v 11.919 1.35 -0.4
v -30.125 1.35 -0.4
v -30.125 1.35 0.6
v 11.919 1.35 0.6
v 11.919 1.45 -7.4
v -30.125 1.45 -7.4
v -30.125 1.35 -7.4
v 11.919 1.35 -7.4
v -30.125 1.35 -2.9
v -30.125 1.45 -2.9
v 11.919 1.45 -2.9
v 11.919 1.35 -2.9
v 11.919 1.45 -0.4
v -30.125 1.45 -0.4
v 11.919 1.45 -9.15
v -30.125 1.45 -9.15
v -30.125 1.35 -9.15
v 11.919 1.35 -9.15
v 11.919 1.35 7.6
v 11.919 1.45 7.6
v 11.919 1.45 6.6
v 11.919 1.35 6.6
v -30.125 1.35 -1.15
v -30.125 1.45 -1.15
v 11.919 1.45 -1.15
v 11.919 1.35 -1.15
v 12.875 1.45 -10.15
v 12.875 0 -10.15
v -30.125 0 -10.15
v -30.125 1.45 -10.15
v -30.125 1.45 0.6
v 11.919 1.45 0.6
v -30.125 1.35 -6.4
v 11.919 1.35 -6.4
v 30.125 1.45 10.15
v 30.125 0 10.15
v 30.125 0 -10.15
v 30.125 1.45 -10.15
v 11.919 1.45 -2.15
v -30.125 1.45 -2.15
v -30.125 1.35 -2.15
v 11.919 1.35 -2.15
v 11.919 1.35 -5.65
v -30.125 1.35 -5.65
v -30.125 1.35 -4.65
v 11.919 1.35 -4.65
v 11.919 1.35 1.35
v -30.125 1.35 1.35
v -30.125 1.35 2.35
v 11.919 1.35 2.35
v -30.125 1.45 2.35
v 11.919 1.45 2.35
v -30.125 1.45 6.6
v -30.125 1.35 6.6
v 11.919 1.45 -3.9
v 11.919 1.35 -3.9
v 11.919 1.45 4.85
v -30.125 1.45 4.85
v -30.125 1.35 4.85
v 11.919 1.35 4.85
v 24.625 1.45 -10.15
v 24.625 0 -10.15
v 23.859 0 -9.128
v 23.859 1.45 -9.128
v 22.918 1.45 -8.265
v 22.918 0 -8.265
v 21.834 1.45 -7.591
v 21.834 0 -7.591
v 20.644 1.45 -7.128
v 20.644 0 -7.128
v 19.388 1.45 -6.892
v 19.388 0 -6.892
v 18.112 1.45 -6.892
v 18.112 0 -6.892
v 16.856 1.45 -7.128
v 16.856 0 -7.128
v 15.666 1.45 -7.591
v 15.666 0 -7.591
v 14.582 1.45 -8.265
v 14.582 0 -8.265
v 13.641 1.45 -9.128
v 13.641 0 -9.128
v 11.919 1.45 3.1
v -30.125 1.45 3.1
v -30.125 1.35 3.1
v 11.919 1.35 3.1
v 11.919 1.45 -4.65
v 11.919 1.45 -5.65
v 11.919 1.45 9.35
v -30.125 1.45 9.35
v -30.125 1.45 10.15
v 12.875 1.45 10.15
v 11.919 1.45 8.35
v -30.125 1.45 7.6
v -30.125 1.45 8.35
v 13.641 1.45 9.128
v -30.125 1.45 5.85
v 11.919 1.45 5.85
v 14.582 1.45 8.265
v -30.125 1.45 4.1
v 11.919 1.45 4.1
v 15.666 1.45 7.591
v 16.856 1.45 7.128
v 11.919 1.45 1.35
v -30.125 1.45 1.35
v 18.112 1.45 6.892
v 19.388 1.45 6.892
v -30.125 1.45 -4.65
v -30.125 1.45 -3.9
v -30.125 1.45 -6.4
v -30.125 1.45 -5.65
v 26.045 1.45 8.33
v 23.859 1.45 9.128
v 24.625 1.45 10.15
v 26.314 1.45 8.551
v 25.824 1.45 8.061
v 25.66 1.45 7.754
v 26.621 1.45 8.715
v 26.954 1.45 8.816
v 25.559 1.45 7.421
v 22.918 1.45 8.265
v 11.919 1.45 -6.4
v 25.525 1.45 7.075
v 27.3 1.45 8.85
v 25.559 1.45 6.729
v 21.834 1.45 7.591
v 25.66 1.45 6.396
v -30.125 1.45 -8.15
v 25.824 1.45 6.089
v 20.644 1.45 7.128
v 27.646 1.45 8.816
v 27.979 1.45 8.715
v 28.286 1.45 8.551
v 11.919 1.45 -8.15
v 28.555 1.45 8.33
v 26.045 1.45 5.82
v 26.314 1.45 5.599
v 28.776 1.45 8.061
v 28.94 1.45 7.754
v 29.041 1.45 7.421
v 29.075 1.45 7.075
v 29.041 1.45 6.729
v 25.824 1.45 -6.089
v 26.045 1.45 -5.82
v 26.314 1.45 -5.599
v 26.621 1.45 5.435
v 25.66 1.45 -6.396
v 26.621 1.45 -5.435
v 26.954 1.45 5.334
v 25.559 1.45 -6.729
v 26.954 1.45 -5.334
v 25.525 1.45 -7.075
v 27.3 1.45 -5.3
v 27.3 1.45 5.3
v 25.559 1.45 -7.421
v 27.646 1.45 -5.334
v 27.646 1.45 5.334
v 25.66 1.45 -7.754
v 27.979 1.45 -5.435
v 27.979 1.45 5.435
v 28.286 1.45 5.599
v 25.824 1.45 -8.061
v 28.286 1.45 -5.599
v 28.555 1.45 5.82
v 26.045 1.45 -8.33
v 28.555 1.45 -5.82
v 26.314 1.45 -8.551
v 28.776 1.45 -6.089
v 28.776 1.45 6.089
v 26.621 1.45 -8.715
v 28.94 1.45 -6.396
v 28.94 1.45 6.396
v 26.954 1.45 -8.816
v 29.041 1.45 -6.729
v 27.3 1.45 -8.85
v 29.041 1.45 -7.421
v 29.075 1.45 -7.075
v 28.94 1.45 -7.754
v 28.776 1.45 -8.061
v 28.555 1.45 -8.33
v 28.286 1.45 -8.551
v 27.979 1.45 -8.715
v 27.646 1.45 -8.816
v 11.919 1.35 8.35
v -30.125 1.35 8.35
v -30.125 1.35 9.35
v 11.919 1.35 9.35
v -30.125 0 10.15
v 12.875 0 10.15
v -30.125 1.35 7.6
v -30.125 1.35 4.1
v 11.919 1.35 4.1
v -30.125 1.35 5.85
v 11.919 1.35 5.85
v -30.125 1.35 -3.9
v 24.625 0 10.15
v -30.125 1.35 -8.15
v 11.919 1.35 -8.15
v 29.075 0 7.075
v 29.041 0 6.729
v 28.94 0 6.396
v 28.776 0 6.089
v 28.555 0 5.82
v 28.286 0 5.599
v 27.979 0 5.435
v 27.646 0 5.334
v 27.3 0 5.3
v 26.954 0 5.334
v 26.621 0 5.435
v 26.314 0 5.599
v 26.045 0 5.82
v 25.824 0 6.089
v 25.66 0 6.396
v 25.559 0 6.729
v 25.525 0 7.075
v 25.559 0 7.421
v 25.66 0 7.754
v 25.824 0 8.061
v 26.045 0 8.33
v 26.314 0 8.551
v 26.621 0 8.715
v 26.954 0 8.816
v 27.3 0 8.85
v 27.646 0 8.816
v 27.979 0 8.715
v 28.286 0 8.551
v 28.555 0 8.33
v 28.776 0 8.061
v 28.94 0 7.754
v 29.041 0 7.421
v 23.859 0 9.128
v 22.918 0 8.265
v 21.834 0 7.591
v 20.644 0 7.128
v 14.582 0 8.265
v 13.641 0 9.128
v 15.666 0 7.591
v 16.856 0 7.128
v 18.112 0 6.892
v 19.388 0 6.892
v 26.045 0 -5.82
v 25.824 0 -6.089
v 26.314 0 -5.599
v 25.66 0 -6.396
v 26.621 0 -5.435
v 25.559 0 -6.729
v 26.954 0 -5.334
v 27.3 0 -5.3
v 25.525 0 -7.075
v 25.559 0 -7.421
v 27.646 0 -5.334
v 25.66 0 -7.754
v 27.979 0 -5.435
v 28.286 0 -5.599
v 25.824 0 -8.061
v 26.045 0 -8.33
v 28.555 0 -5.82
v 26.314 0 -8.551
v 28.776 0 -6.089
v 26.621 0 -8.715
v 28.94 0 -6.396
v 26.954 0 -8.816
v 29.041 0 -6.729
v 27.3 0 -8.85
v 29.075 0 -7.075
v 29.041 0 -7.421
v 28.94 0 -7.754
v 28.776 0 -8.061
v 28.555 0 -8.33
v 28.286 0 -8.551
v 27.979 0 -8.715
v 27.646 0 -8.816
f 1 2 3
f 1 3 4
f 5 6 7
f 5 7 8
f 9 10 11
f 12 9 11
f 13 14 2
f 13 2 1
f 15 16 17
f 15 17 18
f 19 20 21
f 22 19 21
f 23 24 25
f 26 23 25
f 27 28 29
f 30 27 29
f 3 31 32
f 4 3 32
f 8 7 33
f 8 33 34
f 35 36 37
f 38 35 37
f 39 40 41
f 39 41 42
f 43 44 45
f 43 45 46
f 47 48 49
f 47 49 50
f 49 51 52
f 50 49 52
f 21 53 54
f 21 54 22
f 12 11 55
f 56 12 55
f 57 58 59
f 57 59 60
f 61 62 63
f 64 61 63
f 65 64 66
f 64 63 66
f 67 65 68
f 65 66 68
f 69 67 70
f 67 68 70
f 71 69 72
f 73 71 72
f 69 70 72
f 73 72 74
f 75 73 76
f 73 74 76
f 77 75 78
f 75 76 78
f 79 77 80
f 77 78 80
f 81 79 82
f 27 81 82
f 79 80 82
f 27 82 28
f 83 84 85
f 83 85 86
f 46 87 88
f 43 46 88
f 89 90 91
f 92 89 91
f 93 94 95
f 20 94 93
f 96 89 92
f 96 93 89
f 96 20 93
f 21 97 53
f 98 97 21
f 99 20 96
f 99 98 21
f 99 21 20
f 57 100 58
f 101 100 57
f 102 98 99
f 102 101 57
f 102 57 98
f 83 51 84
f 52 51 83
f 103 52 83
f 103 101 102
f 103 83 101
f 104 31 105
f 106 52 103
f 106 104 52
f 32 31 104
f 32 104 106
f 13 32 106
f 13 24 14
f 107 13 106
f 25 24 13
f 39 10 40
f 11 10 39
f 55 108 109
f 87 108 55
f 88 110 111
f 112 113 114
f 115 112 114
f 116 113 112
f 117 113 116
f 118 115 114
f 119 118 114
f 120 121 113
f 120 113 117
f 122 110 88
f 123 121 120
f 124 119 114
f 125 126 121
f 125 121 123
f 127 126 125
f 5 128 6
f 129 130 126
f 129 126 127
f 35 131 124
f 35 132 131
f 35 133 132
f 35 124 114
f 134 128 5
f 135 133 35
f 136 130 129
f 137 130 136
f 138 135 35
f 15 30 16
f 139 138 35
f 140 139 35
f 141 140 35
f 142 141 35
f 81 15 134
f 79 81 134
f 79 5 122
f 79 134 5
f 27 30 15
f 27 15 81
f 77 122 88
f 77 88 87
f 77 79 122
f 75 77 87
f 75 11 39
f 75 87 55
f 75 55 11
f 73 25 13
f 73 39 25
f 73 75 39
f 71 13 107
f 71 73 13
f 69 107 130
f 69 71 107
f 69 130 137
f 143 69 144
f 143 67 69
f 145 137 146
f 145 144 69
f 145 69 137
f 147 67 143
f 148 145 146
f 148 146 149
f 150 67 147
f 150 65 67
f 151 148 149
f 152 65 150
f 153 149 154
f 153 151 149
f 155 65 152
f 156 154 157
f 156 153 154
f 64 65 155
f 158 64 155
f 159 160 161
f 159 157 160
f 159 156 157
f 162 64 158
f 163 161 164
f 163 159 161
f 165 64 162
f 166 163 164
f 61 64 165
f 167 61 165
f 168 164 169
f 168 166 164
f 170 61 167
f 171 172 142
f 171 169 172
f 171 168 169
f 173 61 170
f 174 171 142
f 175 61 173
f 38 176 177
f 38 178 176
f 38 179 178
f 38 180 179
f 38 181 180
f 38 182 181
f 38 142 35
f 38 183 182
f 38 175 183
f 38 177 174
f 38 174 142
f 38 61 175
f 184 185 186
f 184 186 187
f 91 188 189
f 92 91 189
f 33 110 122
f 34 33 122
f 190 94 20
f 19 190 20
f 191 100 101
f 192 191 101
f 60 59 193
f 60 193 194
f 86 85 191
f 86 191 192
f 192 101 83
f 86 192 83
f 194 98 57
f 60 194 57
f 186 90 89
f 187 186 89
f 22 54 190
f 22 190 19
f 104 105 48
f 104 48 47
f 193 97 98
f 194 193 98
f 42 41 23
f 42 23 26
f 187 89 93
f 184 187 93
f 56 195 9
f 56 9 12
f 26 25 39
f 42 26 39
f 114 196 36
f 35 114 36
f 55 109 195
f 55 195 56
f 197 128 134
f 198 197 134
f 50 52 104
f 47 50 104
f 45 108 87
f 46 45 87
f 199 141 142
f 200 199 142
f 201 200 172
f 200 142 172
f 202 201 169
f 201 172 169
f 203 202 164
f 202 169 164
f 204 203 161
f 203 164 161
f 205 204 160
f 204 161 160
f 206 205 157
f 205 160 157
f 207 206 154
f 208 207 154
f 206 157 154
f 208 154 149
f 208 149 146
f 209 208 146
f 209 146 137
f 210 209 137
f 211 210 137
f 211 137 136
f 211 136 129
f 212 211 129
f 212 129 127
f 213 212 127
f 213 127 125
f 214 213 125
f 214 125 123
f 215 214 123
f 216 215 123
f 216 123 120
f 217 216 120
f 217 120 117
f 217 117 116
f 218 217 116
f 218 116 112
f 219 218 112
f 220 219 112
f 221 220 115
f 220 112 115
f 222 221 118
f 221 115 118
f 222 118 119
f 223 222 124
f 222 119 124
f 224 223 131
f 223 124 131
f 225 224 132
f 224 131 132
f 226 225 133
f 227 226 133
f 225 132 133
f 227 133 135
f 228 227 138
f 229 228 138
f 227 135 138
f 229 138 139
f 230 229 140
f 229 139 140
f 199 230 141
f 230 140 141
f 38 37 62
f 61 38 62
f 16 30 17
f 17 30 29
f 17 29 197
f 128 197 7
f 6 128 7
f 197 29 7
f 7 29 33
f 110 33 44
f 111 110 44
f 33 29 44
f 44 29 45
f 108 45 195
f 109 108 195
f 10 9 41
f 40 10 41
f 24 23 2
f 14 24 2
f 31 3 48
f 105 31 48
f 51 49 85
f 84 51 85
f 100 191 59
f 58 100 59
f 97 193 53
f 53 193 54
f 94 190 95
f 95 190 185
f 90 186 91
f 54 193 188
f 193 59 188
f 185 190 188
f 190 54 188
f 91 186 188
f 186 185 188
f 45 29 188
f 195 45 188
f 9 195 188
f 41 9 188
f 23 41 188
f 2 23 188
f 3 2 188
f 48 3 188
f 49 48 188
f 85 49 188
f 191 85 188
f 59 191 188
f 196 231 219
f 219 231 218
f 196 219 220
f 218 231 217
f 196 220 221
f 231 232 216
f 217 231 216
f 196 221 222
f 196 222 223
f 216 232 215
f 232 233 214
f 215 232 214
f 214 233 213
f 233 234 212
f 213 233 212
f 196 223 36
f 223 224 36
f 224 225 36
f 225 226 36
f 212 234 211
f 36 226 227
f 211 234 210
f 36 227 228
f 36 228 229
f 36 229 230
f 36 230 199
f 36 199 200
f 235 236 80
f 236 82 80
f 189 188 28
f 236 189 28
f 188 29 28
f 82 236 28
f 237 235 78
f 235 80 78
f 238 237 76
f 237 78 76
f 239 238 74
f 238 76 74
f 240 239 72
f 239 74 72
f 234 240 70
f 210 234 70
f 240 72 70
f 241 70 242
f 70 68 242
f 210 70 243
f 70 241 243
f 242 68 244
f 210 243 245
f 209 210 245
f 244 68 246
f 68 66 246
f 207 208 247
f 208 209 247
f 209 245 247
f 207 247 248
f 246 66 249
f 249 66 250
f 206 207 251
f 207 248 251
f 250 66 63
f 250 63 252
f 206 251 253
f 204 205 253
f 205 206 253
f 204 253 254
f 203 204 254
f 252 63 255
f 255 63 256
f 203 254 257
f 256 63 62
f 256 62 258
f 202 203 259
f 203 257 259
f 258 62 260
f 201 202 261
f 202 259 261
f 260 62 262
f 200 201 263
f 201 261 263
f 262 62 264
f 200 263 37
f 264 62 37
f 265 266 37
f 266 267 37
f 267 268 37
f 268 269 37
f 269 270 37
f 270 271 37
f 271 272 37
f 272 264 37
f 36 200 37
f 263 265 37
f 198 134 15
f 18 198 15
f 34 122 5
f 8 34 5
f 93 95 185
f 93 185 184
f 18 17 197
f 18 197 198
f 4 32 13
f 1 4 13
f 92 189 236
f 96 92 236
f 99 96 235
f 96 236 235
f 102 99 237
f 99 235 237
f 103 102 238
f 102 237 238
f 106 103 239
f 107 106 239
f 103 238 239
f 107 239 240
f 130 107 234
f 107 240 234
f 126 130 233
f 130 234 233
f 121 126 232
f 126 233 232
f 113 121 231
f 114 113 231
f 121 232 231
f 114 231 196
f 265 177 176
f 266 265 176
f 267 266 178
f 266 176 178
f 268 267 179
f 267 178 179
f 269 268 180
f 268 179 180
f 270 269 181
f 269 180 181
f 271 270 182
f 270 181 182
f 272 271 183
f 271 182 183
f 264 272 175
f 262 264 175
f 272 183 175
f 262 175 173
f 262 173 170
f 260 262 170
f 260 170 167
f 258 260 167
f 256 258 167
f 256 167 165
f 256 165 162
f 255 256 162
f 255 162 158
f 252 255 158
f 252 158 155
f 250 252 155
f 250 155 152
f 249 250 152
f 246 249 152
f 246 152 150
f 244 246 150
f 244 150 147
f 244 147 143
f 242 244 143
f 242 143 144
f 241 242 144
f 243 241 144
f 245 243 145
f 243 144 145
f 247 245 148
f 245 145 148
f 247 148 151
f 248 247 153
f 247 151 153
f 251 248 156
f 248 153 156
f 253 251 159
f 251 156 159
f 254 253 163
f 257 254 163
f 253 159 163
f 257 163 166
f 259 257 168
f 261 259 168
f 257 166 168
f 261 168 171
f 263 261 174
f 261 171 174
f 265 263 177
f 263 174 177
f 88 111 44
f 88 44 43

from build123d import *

# Parameters (mm, degrees)
BOSS_EXTRUDE1_DEPTH = 1.45
SKETCH2_R           = 1.775
CUT_EXTRUDE1_DEPTH  = 2.45
SKETCH3_W           = 42.044311255
SKETCH3_H           = 1
CUT_EXTRUDE2_DEPTH  = 0.1


with BuildPart() as part:
    # Sketch1 → Boss-Extrude1 (new body)
    with BuildSketch(Plane(origin=(0, 0, 0), x_dir=(1, 0, 0), z_dir=(0, 1, 0))):
        with BuildLine():
            Line((-30.125, -10.15), (12.875, -10.15))
            ThreePointArc((12.875, -10.15), (18.75, -6.862513487), (24.625, -10.15))
            Line((24.625, -10.15), (30.125, -10.15))
            Line((30.125, -10.15), (30.125, 10.15))
            Line((30.125, 10.15), (24.625, 10.15))
            ThreePointArc((24.625, 10.15), (18.75, 6.862513487), (12.875, 10.15))
            Line((12.875, 10.15), (-30.125, 10.15))
            Line((-30.125, 10.15), (-30.125, -10.15))
        make_face()
    extrude(amount=BOSS_EXTRUDE1_DEPTH)

    # Sketch2 → Cut-Extrude1 (cut, through all)
    with BuildSketch(Plane(origin=(0, 1.45, 0), x_dir=(1, 0, 0), z_dir=(0, 1, 0))):
        with Locations((27.3, 7.075)):
            Circle(SKETCH2_R)
        with Locations((27.3, -7.075)):
            Circle(SKETCH2_R)
    extrude(amount=-CUT_EXTRUDE1_DEPTH, mode=Mode.SUBTRACT)

    # Sketch3 → Cut-Extrude2 (cut)
    with BuildSketch(Plane(origin=(0, 1.45, 0), x_dir=(1, 0, 0), z_dir=(0, 1, 0))):
        with Locations((-9.102844373, 8.65)):
            Rectangle(SKETCH3_W, SKETCH3_H)
        with Locations((-9.102844373, 6.9)):
            Rectangle(SKETCH3_W, SKETCH3_H)
        with Locations((-9.102844373, 5.15)):
            Rectangle(SKETCH3_W, SKETCH3_H)
        with Locations((-9.102844373, 3.4)):
            Rectangle(SKETCH3_W, SKETCH3_H)
        with Locations((-9.102844373, 1.65)):
            Rectangle(SKETCH3_W, SKETCH3_H)
        with Locations((-9.102844373, -0.1)):
            Rectangle(SKETCH3_W, SKETCH3_H)
        with Locations((-9.102844373, -1.85)):
            Rectangle(SKETCH3_W, SKETCH3_H)
        with Locations((-9.102844373, -3.6)):
            Rectangle(SKETCH3_W, SKETCH3_H)
        with Locations((-9.102844373, -5.35)):
            Rectangle(SKETCH3_W, SKETCH3_H)
        with Locations((-9.102844373, -7.1)):
            Rectangle(SKETCH3_W, SKETCH3_H)
        with Locations((-9.102844373, -8.85)):
            Rectangle(SKETCH3_W, SKETCH3_H)
    extrude(amount=-CUT_EXTRUDE2_DEPTH, mode=Mode.SUBTRACT)


solid = part.part
